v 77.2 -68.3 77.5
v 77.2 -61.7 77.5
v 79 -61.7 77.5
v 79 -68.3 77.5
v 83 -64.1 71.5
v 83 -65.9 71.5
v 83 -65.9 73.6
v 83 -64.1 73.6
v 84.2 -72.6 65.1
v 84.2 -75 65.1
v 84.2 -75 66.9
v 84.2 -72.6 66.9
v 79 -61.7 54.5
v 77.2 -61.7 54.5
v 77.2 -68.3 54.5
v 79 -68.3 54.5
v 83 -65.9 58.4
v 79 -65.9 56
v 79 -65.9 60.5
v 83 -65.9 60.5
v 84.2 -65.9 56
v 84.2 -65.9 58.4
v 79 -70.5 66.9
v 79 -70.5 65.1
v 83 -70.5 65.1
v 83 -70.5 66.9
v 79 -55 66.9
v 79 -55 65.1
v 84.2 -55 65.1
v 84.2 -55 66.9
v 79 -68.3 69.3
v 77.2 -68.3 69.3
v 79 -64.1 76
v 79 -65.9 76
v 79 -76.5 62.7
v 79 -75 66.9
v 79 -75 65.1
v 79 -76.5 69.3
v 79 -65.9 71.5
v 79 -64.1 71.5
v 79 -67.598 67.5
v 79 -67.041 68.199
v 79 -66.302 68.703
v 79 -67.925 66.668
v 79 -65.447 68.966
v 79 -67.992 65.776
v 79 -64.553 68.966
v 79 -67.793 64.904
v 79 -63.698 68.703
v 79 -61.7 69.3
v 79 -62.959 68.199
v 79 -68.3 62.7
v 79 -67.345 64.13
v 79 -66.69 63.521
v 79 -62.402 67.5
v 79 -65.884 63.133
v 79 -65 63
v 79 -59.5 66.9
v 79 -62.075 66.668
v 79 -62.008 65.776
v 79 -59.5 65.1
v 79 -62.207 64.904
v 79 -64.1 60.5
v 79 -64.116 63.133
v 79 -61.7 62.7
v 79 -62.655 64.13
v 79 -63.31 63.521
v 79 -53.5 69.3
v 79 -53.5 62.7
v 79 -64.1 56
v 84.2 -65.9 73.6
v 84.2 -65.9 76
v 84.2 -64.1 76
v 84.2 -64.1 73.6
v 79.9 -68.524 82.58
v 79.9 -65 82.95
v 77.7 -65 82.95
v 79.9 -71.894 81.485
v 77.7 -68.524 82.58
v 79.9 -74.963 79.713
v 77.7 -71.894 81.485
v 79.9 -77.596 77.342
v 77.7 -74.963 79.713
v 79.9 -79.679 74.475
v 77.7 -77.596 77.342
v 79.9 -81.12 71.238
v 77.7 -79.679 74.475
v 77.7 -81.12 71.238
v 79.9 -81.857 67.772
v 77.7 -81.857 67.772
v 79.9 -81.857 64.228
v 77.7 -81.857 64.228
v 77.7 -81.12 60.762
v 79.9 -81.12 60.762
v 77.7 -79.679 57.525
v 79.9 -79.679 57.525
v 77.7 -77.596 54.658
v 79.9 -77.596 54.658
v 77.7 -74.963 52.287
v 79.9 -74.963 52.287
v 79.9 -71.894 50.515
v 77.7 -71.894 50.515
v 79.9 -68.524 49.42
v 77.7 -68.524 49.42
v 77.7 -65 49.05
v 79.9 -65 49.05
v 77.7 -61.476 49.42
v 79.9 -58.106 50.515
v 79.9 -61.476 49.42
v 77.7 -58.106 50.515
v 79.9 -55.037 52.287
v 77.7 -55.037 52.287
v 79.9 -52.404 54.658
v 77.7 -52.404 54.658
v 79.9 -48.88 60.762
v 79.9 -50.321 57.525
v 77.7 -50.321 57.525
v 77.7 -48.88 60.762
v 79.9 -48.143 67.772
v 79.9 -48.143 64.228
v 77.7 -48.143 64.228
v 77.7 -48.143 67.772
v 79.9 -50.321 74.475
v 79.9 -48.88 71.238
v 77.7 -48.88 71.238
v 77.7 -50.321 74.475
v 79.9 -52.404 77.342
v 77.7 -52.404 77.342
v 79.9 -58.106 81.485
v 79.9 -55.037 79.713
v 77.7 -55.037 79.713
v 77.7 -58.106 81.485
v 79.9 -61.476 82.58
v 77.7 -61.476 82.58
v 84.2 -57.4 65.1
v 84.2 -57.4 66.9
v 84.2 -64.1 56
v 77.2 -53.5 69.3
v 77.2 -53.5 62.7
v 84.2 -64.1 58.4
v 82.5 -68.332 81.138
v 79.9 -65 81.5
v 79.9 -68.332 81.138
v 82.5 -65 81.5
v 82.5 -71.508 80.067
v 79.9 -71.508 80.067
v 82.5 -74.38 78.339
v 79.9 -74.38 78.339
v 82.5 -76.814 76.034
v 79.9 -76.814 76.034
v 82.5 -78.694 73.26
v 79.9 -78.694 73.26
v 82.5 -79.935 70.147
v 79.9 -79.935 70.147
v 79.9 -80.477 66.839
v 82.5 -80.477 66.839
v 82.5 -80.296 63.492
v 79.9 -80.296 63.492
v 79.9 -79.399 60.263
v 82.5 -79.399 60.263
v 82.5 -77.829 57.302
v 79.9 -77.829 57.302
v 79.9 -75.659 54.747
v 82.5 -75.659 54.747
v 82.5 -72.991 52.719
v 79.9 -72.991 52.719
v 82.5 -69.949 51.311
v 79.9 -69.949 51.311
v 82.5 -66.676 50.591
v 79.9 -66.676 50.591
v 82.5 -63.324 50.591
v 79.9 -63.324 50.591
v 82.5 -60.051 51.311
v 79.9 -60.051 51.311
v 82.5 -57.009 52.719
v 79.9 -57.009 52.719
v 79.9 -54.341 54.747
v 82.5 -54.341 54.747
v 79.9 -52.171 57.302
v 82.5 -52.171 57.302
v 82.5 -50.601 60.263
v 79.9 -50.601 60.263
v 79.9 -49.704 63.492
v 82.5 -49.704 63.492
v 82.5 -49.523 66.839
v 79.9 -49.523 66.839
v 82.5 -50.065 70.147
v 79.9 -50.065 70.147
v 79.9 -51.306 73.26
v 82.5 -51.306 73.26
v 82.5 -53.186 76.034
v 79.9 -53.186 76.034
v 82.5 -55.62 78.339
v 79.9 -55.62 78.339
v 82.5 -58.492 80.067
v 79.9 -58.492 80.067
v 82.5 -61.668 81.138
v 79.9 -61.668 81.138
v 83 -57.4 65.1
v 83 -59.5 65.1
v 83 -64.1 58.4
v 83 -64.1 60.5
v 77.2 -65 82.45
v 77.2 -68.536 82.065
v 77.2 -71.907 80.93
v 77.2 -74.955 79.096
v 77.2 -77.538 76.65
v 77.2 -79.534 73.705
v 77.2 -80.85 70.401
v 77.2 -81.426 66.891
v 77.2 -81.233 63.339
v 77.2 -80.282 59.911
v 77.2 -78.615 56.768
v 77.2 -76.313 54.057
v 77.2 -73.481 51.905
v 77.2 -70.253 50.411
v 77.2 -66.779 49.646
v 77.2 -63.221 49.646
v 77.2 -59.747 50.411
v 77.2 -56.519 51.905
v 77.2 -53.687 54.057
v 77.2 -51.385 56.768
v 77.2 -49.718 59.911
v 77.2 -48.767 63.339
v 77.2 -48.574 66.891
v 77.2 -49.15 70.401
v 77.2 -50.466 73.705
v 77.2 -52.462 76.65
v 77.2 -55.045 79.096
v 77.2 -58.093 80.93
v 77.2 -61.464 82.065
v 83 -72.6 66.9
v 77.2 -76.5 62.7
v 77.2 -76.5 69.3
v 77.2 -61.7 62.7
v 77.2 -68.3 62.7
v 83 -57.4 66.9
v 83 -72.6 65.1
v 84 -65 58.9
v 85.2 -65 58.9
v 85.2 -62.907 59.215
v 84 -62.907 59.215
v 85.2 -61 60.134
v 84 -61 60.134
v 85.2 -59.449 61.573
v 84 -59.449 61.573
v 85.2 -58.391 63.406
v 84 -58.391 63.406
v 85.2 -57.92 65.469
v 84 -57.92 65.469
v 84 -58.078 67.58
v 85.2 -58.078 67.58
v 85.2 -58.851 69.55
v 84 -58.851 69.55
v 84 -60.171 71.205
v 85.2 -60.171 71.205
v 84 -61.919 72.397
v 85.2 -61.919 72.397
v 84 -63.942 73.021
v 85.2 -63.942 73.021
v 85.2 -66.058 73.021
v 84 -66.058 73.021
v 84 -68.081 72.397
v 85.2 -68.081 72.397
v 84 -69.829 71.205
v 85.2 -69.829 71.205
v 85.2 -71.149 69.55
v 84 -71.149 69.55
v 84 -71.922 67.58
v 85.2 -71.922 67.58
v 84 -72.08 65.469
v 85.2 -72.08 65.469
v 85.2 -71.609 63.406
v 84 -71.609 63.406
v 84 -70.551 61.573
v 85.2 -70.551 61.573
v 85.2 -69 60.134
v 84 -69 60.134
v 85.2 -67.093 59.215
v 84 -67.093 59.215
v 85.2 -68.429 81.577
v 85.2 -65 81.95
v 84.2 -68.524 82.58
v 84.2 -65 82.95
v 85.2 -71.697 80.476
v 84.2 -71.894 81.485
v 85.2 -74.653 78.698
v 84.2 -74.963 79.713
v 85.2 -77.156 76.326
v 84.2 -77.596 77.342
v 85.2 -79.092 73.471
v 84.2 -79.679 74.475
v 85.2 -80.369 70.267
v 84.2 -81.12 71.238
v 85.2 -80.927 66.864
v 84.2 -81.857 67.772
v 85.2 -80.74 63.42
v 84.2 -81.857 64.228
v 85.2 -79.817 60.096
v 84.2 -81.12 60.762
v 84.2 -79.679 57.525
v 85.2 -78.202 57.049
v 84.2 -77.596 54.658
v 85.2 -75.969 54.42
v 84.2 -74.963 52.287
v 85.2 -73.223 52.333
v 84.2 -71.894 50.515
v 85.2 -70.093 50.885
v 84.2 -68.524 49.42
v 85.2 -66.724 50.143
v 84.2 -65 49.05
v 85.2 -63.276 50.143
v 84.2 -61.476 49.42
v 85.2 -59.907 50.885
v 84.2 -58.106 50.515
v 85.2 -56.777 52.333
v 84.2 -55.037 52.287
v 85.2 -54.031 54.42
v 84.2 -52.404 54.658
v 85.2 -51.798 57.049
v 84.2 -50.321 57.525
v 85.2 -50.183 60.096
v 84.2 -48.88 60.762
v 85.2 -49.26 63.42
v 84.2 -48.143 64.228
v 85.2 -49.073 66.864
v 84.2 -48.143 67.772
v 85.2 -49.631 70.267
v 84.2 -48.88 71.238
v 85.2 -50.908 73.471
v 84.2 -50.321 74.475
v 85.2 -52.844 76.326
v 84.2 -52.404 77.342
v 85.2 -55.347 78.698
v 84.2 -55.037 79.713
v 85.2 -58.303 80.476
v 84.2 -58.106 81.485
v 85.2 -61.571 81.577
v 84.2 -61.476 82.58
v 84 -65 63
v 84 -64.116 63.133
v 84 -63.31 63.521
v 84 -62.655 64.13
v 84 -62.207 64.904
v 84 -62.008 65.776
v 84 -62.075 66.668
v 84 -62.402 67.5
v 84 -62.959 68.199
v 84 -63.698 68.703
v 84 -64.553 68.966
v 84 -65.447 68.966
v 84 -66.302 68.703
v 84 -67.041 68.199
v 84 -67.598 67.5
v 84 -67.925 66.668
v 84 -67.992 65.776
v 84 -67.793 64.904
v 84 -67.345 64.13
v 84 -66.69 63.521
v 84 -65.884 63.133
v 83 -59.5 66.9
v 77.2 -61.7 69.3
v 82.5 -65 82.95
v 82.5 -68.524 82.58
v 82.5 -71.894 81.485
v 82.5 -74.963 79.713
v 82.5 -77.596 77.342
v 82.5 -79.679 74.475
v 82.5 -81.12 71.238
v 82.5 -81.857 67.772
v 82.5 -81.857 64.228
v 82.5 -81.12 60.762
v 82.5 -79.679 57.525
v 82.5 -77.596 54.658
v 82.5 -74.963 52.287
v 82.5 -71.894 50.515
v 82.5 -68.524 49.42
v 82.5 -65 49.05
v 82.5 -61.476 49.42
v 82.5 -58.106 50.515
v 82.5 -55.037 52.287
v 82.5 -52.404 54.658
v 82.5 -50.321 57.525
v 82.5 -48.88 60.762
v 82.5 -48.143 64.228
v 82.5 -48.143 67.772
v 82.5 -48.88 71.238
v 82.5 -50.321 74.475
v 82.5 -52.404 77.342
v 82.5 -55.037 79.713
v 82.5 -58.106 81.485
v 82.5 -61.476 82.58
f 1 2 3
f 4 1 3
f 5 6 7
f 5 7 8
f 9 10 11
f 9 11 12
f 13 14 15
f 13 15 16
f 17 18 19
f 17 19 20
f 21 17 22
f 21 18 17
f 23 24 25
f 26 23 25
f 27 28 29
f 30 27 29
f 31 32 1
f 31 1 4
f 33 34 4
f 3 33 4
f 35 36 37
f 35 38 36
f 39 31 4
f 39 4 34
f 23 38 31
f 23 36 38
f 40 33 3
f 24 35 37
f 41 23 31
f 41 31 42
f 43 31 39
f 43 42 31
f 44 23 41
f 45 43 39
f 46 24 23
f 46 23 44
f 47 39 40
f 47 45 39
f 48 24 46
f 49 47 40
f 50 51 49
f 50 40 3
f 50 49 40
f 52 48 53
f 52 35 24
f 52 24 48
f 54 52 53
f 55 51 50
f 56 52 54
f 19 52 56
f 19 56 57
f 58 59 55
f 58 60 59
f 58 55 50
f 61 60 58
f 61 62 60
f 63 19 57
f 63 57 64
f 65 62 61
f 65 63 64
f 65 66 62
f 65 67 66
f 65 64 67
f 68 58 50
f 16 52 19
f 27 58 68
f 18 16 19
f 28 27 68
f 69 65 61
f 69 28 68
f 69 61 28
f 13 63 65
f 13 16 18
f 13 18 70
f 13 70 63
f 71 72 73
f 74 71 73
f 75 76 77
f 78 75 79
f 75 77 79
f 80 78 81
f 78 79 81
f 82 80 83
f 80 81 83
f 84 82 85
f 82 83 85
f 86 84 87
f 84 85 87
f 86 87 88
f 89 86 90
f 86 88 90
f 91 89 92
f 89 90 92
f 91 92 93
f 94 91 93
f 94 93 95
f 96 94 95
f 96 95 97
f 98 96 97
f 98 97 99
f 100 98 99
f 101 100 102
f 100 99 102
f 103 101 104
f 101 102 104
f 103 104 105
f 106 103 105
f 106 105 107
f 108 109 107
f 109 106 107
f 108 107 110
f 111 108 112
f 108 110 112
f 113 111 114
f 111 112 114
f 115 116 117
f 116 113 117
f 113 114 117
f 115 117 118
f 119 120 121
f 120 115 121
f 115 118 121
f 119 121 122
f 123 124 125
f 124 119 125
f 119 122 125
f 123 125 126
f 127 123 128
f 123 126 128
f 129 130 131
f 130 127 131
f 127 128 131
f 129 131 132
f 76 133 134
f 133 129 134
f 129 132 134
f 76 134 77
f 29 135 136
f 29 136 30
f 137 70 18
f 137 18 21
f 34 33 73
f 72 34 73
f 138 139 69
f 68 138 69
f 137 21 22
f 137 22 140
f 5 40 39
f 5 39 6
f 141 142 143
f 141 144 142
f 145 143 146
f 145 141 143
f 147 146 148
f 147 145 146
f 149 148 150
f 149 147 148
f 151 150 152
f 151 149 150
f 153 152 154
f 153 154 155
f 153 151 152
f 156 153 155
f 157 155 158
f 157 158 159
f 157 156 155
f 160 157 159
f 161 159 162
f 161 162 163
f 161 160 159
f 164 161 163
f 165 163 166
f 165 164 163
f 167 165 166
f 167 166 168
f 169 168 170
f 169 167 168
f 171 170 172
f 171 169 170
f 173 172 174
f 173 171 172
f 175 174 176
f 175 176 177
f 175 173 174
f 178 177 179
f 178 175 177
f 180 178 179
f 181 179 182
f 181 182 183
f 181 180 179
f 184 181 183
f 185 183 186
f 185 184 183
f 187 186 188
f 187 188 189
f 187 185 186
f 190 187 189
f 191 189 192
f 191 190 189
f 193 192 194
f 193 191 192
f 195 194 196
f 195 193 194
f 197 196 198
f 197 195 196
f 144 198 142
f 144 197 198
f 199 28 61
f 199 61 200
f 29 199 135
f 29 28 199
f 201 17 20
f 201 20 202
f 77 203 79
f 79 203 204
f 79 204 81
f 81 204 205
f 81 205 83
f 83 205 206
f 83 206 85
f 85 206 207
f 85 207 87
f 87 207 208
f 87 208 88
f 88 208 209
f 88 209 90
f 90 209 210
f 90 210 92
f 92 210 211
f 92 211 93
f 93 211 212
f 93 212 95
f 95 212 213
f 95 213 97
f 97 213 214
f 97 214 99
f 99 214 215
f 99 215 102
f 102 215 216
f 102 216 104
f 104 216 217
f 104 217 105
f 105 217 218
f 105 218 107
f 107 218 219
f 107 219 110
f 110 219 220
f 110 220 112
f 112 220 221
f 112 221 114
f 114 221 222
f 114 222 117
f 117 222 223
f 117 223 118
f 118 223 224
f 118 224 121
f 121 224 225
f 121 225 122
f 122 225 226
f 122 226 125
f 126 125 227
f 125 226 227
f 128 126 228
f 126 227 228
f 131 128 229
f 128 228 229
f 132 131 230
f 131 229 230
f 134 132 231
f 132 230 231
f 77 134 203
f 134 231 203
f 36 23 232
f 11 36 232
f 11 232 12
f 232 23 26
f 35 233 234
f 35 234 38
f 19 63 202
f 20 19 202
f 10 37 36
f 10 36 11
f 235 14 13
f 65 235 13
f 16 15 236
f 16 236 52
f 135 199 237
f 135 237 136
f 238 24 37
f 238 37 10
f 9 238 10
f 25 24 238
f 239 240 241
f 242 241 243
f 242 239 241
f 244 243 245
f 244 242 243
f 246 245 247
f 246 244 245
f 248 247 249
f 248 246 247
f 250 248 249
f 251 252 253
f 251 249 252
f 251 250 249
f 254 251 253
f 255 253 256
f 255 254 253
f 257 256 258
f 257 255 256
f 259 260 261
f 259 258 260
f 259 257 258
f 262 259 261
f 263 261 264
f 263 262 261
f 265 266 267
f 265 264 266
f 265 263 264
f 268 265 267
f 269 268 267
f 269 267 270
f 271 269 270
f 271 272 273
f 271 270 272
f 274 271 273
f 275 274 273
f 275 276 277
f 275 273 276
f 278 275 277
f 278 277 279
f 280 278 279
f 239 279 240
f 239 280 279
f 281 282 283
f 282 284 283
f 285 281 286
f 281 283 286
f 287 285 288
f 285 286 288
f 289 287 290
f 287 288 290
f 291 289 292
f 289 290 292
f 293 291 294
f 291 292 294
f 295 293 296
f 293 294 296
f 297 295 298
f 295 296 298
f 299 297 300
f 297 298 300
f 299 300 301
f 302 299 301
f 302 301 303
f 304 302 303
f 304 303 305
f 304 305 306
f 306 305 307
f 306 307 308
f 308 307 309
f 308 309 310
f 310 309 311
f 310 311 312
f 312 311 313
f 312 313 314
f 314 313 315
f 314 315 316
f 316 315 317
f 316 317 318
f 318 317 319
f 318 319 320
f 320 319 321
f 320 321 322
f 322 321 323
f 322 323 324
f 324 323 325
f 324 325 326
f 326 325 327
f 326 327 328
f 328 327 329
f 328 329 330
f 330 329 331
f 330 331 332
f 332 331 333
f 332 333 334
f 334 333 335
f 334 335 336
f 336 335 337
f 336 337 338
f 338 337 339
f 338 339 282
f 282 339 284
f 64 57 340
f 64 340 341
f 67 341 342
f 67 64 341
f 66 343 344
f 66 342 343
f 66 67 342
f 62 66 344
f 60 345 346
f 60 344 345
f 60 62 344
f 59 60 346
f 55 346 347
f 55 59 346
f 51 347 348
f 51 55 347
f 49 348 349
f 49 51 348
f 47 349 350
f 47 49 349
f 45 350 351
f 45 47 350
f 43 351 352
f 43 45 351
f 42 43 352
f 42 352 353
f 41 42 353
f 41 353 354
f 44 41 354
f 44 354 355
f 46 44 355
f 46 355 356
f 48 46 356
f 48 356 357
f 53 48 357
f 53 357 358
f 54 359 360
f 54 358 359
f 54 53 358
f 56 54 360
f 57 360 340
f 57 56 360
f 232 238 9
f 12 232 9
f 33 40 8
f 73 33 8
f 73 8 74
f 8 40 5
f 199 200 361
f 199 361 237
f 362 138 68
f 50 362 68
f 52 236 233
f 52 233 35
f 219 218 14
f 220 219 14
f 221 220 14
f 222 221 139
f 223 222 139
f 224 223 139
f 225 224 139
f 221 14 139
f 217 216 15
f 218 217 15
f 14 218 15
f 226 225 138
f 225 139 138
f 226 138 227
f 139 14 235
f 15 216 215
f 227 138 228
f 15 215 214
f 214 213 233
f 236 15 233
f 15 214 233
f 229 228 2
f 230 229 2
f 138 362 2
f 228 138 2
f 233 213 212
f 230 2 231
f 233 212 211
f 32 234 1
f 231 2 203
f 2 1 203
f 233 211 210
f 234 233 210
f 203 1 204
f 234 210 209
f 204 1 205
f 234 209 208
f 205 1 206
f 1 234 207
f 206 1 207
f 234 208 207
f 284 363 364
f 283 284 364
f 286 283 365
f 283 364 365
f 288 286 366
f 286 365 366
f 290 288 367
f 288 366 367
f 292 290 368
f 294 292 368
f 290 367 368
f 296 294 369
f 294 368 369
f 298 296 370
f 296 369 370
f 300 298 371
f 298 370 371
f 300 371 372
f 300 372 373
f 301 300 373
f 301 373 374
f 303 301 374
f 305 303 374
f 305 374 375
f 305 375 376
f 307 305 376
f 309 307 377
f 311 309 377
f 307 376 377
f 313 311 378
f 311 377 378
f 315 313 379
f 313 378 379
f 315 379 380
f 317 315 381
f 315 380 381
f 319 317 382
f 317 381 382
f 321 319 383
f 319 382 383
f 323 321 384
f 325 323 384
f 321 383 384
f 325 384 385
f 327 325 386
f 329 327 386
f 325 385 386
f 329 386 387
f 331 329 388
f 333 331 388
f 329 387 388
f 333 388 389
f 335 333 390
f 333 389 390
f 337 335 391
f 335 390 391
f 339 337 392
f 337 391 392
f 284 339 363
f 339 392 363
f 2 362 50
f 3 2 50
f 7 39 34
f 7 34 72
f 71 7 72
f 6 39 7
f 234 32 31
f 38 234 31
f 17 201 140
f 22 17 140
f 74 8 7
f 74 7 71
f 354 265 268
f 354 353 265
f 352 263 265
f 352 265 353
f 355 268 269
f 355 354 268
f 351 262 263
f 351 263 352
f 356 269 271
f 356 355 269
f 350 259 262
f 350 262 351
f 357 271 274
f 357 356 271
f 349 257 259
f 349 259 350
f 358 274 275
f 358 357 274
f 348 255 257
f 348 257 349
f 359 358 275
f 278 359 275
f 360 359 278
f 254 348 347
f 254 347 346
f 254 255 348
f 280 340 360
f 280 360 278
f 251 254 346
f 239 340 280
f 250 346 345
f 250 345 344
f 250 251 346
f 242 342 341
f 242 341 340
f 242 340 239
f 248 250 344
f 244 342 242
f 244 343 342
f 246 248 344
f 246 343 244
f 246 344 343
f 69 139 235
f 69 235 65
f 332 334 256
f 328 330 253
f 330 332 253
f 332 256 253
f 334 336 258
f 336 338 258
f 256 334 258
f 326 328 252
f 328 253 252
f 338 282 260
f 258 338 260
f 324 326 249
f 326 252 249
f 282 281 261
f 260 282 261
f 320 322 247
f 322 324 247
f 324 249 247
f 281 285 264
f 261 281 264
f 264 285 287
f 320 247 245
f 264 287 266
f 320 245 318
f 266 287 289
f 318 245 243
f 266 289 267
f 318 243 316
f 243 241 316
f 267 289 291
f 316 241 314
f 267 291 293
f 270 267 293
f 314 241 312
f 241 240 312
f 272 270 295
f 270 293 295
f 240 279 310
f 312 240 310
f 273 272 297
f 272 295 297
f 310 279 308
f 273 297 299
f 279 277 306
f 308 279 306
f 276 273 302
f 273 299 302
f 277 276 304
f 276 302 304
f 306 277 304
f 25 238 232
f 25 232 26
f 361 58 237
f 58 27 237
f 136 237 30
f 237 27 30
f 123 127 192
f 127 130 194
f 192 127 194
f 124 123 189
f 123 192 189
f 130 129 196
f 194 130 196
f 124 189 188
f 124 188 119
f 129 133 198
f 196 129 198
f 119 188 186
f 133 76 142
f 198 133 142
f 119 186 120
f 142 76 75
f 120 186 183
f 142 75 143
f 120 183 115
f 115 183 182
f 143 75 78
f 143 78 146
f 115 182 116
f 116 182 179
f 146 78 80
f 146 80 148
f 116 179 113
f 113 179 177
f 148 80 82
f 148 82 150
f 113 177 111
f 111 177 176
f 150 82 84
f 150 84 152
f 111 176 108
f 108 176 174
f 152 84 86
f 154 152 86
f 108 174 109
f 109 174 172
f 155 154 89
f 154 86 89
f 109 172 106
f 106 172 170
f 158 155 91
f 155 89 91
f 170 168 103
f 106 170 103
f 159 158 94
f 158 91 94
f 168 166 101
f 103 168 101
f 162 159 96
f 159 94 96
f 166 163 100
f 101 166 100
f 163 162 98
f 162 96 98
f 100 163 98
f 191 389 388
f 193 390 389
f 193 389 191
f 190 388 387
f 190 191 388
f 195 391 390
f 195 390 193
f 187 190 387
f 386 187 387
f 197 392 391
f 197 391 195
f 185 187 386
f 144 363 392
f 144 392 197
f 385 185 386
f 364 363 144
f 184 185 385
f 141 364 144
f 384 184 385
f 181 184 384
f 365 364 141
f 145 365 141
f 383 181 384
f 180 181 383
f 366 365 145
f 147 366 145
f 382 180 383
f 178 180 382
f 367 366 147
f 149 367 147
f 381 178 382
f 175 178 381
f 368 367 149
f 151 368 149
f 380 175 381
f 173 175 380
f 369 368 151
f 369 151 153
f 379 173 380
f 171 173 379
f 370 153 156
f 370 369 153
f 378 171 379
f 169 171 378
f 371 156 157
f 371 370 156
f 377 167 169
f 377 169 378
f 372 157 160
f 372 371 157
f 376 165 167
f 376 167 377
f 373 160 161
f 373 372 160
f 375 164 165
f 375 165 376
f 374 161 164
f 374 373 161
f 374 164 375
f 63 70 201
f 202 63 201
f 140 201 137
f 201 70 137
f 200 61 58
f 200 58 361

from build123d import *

# Parameters (mm, degrees)
SKETCH2_W            = 2.6
SKETCH2_H            = 2.45
BOSS_EXTRUDE1_START  = 62.7
SKETCH3_W            = 2.3
SKETCH3_H            = 23
BOSS_EXTRUDE1_DEPTH  = 6.6
BOSS_EXTRUDE2_START  = 54.5
SKETCH4_W            = 2.3
SKETCH4_H            = 6.6
BOSS_EXTRUDE2_DEPTH  = 23
BOSS_EXTRUDE3_START  = 76.7
SKETCH5_R            = 4.6
BOSS_EXTRUDE3_DEPTH  = 2.3
BOSS_EXTRUDE4_START  = 84
SKETCH6_R            = 7.1
BOSS_EXTRUDE4_DEPTH  = 1.7
BOSS_EXTRUDE5_START  = 78.9
SKETCH7_R            = 3
BOSS_EXTRUDE5_DEPTH  = 5.2
BOSS_EXTRUDE6_START  = 65.1
SKETCH8_W            = 4.1
SKETCH8_H            = 2.1
BOSS_EXTRUDE6_DEPTH  = 1.8
BOSS_EXTRUDE7_START  = 71.5
SKETCH9_W            = 4.1
SKETCH9_H            = 1.8
BOSS_EXTRUDE7_DEPTH  = 2.1
BOSS_EXTRUDE8_START  = 65.1
SKETCH10_W           = 4.1
SKETCH10_H           = 2.1
BOSS_EXTRUDE8_DEPTH  = 1.8
BOSS_EXTRUDE9_START  = 58.4
SKETCH11_W           = 4.1
SKETCH11_H           = 1.8
BOSS_EXTRUDE9_DEPTH  = 2.1
BOSS_EXTRUDE10_START = 65.1
SKETCH12_W           = 5.3
SKETCH12_H           = 2.4
BOSS_EXTRUDE10_DEPTH = 1.8
BOSS_EXTRUDE11_START = 73.6
SKETCH13_W           = 5.3
SKETCH13_H           = 1.8
BOSS_EXTRUDE11_DEPTH = 2.4
BOSS_EXTRUDE12_START = 65.1
SKETCH14_W           = 5.3
SKETCH14_H           = 2.4
BOSS_EXTRUDE12_DEPTH = 1.8
BOSS_EXTRUDE13_START = 56
SKETCH15_W           = 5.3
SKETCH15_H           = 1.8
BOSS_EXTRUDE13_DEPTH = 2.4


with BuildPart() as part:
    # Sketch1 → Revolve1 (revolve)
    with BuildSketch(Plane.XY.offset(66)):
        Polygon((77.2, -65), (85.2, -65), (85.2, -49.05), (84.2, -48.05), (77.7, -48.05), (77.2, -48.55), align=None)
    revolve(axis=Axis((72.2, -65, 66), (1, 0, 0)))


with BuildPart() as body_2:
    # Sketch2 → Revolve2 (revolve)
    with BuildSketch(Plane.XY.offset(66)):
        with Locations((81.2, -48.275)):
            Rectangle(SKETCH2_W, SKETCH2_H)
    revolve(axis=Axis((74.9, -65, 66), (1, 0, 0)))


with BuildPart() as part_1:
    add(part.part)

    # Combine1: cut body 2
    add(body_2.part, mode=Mode.SUBTRACT)


with BuildPart() as body_2_2:
    # Sketch3 → Boss-Extrude1 (new body)
    with BuildSketch(Plane.XY.offset(BOSS_EXTRUDE1_START)):
        with Locations((77.85, -65)):
            Rectangle(SKETCH3_W, SKETCH3_H)
    extrude(amount=BOSS_EXTRUDE1_DEPTH)


with BuildPart() as part_2:
    add(part_1.part)

    # Combine2: cut body 2 2
    add(body_2_2.part, mode=Mode.SUBTRACT)


with BuildPart() as body_2_3:
    # Sketch4 → Boss-Extrude2 (new body)
    with BuildSketch(Plane.XY.offset(BOSS_EXTRUDE2_START)):
        with Locations((77.85, -65)):
            Rectangle(SKETCH4_W, SKETCH4_H)
    extrude(amount=BOSS_EXTRUDE2_DEPTH)


with BuildPart() as part_3:
    add(part_2.part)

    # Combine3: cut body 2 3
    add(body_2_3.part, mode=Mode.SUBTRACT)


with BuildPart() as body_2_4:
    # Sketch5 → Boss-Extrude3 (new body)
    with BuildSketch(Plane(origin=(0, 0, 0), x_dir=(0, 0, -1), z_dir=(1, 0, 0)).offset(BOSS_EXTRUDE3_START)):
        with Locations((-66, -65)):
            Circle(SKETCH5_R)
    extrude(amount=BOSS_EXTRUDE3_DEPTH)


with BuildPart() as part_4:
    add(part_3.part)

    # Combine4: cut body 2 4
    add(body_2_4.part, mode=Mode.SUBTRACT)


with BuildPart() as body_2_5:
    # Sketch6 → Boss-Extrude4 (new body)
    with BuildSketch(Plane(origin=(0, 0, 0), x_dir=(0, 0, -1), z_dir=(1, 0, 0)).offset(BOSS_EXTRUDE4_START)):
        with Locations((-66, -65)):
            Circle(SKETCH6_R)
    extrude(amount=BOSS_EXTRUDE4_DEPTH)


with BuildPart() as part_5:
    add(part_4.part)

    # Combine5: cut body 2 5
    add(body_2_5.part, mode=Mode.SUBTRACT)


with BuildPart() as body_2_6:
    # Sketch7 → Boss-Extrude5 (new body)
    with BuildSketch(Plane(origin=(0, 0, 0), x_dir=(0, 0, -1), z_dir=(1, 0, 0)).offset(BOSS_EXTRUDE5_START)):
        with Locations((-66, -65)):
            Circle(SKETCH7_R)
    extrude(amount=BOSS_EXTRUDE5_DEPTH)


with BuildPart() as part_6:
    add(part_5.part)

    # Combine6: cut body 2 6
    add(body_2_6.part, mode=Mode.SUBTRACT)


with BuildPart() as body_2_7:
    # Sketch8 → Boss-Extrude6 (new body)
    with BuildSketch(Plane.XY.offset(BOSS_EXTRUDE6_START)):
        with Locations((80.95, -58.45)):
            Rectangle(SKETCH8_W, SKETCH8_H)
    extrude(amount=BOSS_EXTRUDE6_DEPTH)


with BuildPart() as part_7:
    add(part_6.part)

    # Combine7: cut body 2 7
    add(body_2_7.part, mode=Mode.SUBTRACT)


with BuildPart() as body_2_8:
    # Sketch9 → Boss-Extrude7 (new body)
    with BuildSketch(Plane.XY.offset(BOSS_EXTRUDE7_START)):
        with Locations((80.95, -65)):
            Rectangle(SKETCH9_W, SKETCH9_H)
    extrude(amount=BOSS_EXTRUDE7_DEPTH)


with BuildPart() as part_8:
    add(part_7.part)

    # Combine8: cut body 2 8
    add(body_2_8.part, mode=Mode.SUBTRACT)


with BuildPart() as body_2_9:
    # Sketch10 → Boss-Extrude8 (new body)
    with BuildSketch(Plane.XY.offset(BOSS_EXTRUDE8_START)):
        with Locations((80.95, -71.55)):
            Rectangle(SKETCH10_W, SKETCH10_H)
    extrude(amount=BOSS_EXTRUDE8_DEPTH)


with BuildPart() as part_9:
    add(part_8.part)

    # Combine9: cut body 2 9
    add(body_2_9.part, mode=Mode.SUBTRACT)


with BuildPart() as body_2_10:
    # Sketch11 → Boss-Extrude9 (new body)
    with BuildSketch(Plane.XY.offset(BOSS_EXTRUDE9_START)):
        with Locations((80.95, -65)):
            Rectangle(SKETCH11_W, SKETCH11_H)
    extrude(amount=BOSS_EXTRUDE9_DEPTH)


with BuildPart() as part_10:
    add(part_9.part)

    # Combine10: cut body 2 10
    add(body_2_10.part, mode=Mode.SUBTRACT)


with BuildPart() as body_2_11:
    # Sketch12 → Boss-Extrude10 (new body)
    with BuildSketch(Plane.XY.offset(BOSS_EXTRUDE10_START)):
        with Locations((81.55, -56.2)):
            Rectangle(SKETCH12_W, SKETCH12_H)
    extrude(amount=BOSS_EXTRUDE10_DEPTH)


with BuildPart() as part_11:
    add(part_10.part)

    # Combine11: cut body 2 11
    add(body_2_11.part, mode=Mode.SUBTRACT)


with BuildPart() as body_2_12:
    # Sketch13 → Boss-Extrude11 (new body)
    with BuildSketch(Plane.XY.offset(BOSS_EXTRUDE11_START)):
        with Locations((81.55, -65)):
            Rectangle(SKETCH13_W, SKETCH13_H)
    extrude(amount=BOSS_EXTRUDE11_DEPTH)


with BuildPart() as part_12:
    add(part_11.part)

    # Combine12: cut body 2 12
    add(body_2_12.part, mode=Mode.SUBTRACT)


with BuildPart() as body_2_13:
    # Sketch14 → Boss-Extrude12 (new body)
    with BuildSketch(Plane.XY.offset(BOSS_EXTRUDE12_START)):
        with Locations((81.55, -73.8)):
            Rectangle(SKETCH14_W, SKETCH14_H)
    extrude(amount=BOSS_EXTRUDE12_DEPTH)


with BuildPart() as part_13:
    add(part_12.part)

    # Combine13: cut body 2 13
    add(body_2_13.part, mode=Mode.SUBTRACT)


with BuildPart() as body_2_14:
    # Sketch15 → Boss-Extrude13 (new body)
    with BuildSketch(Plane.XY.offset(BOSS_EXTRUDE13_START)):
        with Locations((81.55, -65)):
            Rectangle(SKETCH15_W, SKETCH15_H)
    extrude(amount=BOSS_EXTRUDE13_DEPTH)


with BuildPart() as part_14:
    add(part_13.part)

    # Combine14: cut body 2 14
    add(body_2_14.part, mode=Mode.SUBTRACT)


solid = part_14.part
